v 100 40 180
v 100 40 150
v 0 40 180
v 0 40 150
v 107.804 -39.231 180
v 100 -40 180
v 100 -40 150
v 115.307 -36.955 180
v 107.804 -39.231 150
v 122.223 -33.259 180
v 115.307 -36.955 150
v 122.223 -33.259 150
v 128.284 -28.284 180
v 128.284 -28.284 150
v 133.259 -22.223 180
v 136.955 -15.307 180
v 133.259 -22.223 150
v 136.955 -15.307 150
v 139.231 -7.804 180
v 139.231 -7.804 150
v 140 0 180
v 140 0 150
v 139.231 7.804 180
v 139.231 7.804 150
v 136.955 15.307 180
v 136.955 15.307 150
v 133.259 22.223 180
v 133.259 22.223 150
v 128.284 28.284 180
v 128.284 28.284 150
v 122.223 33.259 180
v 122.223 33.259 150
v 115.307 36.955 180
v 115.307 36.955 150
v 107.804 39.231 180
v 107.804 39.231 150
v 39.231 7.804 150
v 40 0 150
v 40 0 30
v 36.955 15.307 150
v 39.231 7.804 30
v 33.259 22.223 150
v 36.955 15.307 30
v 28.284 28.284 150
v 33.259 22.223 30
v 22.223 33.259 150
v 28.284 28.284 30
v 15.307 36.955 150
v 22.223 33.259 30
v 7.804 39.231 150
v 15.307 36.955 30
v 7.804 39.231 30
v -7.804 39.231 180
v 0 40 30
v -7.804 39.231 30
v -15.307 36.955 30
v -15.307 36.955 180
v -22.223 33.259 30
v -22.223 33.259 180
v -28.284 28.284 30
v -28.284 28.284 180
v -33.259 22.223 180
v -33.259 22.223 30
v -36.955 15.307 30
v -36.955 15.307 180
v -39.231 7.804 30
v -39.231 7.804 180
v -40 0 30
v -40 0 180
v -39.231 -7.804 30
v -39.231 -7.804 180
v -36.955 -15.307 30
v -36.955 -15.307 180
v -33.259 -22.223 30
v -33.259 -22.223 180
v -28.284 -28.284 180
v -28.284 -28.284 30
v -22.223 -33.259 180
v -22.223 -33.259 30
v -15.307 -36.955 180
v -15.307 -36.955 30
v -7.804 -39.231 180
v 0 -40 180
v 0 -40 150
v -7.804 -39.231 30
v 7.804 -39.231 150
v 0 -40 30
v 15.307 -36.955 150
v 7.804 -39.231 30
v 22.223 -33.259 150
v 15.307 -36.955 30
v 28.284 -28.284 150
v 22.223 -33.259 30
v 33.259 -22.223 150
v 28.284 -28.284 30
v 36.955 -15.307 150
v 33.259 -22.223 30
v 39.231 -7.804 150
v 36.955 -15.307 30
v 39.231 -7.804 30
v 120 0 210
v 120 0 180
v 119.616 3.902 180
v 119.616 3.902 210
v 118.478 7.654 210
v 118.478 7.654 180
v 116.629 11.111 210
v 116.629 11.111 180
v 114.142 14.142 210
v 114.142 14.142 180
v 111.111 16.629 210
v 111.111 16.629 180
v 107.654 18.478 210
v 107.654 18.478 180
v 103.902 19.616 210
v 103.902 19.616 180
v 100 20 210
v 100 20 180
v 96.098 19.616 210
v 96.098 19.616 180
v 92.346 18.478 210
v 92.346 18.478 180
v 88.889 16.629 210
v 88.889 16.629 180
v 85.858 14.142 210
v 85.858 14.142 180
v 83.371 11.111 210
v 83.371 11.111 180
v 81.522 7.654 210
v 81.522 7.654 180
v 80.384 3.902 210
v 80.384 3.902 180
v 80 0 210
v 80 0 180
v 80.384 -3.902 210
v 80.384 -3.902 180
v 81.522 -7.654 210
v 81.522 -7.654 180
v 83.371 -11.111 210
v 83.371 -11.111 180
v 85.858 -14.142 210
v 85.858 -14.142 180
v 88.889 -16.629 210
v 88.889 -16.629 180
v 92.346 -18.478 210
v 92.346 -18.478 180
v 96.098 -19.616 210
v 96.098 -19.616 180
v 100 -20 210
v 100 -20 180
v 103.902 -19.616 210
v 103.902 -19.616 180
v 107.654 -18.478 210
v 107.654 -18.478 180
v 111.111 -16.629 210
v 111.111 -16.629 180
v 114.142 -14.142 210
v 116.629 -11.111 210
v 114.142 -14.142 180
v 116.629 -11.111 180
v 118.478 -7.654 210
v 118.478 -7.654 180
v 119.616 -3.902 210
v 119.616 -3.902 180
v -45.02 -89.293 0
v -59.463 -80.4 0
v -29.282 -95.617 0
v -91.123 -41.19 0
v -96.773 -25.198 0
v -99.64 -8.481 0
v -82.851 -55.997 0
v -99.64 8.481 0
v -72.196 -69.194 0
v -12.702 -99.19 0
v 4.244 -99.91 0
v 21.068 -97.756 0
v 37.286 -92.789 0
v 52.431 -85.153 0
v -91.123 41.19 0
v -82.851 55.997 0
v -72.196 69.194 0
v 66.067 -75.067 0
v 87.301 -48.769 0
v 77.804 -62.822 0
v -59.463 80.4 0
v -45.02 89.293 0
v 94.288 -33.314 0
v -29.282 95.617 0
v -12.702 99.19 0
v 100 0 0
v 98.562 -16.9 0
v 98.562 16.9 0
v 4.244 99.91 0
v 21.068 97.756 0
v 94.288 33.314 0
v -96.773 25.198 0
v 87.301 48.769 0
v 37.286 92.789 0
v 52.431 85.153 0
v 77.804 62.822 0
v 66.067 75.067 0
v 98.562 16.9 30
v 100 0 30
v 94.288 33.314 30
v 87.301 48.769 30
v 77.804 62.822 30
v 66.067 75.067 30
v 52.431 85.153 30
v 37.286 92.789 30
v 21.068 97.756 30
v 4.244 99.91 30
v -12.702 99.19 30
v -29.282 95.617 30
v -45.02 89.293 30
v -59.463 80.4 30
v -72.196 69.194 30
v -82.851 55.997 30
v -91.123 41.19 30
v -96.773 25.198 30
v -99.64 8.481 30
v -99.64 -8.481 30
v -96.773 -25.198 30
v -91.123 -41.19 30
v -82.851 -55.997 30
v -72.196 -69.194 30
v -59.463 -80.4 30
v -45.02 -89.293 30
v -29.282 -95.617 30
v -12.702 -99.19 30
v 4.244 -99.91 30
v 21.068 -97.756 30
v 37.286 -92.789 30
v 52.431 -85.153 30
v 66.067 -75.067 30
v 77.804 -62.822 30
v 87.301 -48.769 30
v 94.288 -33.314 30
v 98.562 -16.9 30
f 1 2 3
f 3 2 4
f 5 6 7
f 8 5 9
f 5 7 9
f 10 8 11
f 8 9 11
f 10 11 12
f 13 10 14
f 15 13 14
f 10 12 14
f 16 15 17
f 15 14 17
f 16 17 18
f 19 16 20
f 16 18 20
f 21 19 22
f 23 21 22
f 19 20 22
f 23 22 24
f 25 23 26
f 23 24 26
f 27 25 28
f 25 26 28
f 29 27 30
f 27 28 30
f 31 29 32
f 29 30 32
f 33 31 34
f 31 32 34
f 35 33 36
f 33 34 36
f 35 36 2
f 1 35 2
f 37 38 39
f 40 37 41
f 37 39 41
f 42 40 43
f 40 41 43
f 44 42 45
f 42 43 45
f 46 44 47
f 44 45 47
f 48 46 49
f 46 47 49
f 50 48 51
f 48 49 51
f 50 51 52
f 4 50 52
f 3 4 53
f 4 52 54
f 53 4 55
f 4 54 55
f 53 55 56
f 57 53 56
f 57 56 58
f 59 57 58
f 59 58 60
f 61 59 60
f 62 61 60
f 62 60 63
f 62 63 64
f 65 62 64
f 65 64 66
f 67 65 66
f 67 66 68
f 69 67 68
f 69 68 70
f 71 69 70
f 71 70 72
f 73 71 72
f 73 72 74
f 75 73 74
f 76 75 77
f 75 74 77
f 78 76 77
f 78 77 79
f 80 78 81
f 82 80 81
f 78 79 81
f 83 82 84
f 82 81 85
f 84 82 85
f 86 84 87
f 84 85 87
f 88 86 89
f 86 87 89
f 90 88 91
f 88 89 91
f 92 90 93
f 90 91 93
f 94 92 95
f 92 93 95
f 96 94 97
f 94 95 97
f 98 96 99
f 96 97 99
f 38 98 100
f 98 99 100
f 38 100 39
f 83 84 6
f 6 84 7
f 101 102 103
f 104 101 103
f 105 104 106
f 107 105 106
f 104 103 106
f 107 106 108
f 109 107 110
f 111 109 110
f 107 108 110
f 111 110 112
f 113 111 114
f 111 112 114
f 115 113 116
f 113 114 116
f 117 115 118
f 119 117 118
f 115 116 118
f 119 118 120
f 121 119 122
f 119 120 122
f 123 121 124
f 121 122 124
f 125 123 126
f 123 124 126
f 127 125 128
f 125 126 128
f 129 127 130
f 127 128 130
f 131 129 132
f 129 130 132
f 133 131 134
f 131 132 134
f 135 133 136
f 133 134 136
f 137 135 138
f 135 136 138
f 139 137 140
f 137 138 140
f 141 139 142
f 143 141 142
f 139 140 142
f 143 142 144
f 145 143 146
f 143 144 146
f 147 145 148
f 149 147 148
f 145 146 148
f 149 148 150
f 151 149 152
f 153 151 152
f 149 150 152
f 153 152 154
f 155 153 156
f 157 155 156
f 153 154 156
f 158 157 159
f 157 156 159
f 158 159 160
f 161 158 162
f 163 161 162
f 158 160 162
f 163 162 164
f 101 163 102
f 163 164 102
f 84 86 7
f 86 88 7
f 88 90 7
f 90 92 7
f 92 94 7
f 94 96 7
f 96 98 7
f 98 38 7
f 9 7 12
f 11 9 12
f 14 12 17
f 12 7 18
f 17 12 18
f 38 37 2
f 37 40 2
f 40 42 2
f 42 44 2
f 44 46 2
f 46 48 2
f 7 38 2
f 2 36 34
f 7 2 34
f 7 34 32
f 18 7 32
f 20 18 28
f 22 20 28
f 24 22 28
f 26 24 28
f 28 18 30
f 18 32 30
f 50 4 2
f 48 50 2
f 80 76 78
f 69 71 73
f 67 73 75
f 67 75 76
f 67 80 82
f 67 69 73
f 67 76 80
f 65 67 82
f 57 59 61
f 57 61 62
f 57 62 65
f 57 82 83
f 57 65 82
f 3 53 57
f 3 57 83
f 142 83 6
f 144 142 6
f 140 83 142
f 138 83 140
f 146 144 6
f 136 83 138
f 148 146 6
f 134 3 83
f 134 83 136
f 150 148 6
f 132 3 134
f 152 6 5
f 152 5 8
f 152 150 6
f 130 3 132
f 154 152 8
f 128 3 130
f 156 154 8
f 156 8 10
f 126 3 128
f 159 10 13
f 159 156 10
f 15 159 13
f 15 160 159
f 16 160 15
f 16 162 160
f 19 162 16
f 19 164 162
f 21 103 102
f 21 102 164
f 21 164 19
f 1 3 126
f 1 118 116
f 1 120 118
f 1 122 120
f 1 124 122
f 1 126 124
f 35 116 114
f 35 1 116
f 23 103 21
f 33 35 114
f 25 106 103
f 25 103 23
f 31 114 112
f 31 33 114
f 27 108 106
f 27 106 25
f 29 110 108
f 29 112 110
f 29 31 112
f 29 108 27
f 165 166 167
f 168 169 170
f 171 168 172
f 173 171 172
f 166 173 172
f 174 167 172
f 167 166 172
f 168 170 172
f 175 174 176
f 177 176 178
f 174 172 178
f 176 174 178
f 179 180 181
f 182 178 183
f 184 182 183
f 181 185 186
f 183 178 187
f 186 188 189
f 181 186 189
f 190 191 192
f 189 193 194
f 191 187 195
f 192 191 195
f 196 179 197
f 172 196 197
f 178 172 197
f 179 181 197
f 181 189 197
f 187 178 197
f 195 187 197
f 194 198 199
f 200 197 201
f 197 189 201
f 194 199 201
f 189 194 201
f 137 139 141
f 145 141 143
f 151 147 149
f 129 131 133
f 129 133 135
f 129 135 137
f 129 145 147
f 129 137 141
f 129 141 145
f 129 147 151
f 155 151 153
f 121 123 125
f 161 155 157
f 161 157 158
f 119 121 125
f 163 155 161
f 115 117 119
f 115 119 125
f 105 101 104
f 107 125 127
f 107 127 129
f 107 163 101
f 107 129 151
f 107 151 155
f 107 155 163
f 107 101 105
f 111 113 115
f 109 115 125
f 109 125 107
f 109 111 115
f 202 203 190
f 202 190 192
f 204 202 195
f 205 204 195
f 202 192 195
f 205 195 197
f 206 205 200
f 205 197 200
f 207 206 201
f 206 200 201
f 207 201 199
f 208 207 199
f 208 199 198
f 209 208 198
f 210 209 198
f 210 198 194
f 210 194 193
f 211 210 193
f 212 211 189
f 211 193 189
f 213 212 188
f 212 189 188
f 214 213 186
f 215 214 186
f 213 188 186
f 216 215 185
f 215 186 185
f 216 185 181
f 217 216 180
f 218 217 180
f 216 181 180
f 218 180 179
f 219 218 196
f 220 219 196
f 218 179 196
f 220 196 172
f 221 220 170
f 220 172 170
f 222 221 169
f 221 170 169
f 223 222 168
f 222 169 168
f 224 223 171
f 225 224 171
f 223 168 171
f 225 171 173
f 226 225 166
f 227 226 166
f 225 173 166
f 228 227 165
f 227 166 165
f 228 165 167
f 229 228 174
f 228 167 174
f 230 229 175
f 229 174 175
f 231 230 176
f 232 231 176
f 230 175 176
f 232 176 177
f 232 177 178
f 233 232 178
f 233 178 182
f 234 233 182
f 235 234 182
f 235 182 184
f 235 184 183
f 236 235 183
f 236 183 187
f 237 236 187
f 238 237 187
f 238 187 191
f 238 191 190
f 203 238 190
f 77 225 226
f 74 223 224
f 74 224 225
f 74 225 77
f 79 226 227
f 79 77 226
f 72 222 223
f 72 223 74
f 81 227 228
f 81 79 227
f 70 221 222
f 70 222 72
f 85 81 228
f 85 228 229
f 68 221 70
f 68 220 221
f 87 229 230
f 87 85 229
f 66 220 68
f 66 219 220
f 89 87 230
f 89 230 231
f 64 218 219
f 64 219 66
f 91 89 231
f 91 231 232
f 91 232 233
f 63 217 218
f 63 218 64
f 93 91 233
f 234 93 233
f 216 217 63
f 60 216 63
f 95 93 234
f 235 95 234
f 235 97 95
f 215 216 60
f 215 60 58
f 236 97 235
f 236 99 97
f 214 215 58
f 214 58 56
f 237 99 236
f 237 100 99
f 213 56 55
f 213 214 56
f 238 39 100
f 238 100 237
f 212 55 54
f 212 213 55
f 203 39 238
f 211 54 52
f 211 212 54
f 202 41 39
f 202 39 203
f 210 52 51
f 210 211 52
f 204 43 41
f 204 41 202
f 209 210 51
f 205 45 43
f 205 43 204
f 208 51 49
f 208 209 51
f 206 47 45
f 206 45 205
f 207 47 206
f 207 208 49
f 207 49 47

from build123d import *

# Parameters (mm, degrees)
SKETCH2_R           = 100
BOSS_EXTRUDE1_DEPTH = 30
SKETCH3_R           = 40
BOSS_EXTRUDE2_DEPTH = 150
CUT_EXTRUDE1_START  = -30
CUT_EXTRUDE1_DEPTH  = 30
BOSS_EXTRUDE6_DEPTH = 30
SKETCH6_R           = 20
BOSS_EXTRUDE7_DEPTH = 30


with BuildPart() as part:
    # Sketch2 → Boss-Extrude1 (new body)
    with BuildSketch(Plane.XY):
        Circle(SKETCH2_R)
    extrude(amount=BOSS_EXTRUDE1_DEPTH)

    # Sketch3 → Boss-Extrude2 (add)
    with BuildSketch(Plane.XY.offset(30)):
        Circle(SKETCH3_R)
    extrude(amount=BOSS_EXTRUDE2_DEPTH)

    # Sketch4 → Cut-Extrude1 (cut)
    with BuildSketch(Plane.XY.offset(180).offset(CUT_EXTRUDE1_START)):
        with BuildLine():
            Line((0, 40), (0, -40))
            ThreePointArc((0, -40), (40, 0), (0, 40))
        make_face()
    extrude(amount=CUT_EXTRUDE1_DEPTH, mode=Mode.SUBTRACT)

    # Sketch5 → Boss-Extrude6 (add)
    with BuildSketch(Plane.XY.offset(150)):
        with BuildLine():
            Line((100, 40), (0, 40))
            Line((0, 40), (0, -40))
            Line((0, -40), (100, -40))
            ThreePointArc((100, -40), (140, 0), (100, 40))
        make_face()
    extrude(amount=BOSS_EXTRUDE6_DEPTH)

    # Sketch6 → Boss-Extrude7 (add)
    with BuildSketch(Plane.XY.offset(180)):
        with Locations((100, 0)):
            Circle(SKETCH6_R)
    extrude(amount=BOSS_EXTRUDE7_DEPTH)


solid = part.part
